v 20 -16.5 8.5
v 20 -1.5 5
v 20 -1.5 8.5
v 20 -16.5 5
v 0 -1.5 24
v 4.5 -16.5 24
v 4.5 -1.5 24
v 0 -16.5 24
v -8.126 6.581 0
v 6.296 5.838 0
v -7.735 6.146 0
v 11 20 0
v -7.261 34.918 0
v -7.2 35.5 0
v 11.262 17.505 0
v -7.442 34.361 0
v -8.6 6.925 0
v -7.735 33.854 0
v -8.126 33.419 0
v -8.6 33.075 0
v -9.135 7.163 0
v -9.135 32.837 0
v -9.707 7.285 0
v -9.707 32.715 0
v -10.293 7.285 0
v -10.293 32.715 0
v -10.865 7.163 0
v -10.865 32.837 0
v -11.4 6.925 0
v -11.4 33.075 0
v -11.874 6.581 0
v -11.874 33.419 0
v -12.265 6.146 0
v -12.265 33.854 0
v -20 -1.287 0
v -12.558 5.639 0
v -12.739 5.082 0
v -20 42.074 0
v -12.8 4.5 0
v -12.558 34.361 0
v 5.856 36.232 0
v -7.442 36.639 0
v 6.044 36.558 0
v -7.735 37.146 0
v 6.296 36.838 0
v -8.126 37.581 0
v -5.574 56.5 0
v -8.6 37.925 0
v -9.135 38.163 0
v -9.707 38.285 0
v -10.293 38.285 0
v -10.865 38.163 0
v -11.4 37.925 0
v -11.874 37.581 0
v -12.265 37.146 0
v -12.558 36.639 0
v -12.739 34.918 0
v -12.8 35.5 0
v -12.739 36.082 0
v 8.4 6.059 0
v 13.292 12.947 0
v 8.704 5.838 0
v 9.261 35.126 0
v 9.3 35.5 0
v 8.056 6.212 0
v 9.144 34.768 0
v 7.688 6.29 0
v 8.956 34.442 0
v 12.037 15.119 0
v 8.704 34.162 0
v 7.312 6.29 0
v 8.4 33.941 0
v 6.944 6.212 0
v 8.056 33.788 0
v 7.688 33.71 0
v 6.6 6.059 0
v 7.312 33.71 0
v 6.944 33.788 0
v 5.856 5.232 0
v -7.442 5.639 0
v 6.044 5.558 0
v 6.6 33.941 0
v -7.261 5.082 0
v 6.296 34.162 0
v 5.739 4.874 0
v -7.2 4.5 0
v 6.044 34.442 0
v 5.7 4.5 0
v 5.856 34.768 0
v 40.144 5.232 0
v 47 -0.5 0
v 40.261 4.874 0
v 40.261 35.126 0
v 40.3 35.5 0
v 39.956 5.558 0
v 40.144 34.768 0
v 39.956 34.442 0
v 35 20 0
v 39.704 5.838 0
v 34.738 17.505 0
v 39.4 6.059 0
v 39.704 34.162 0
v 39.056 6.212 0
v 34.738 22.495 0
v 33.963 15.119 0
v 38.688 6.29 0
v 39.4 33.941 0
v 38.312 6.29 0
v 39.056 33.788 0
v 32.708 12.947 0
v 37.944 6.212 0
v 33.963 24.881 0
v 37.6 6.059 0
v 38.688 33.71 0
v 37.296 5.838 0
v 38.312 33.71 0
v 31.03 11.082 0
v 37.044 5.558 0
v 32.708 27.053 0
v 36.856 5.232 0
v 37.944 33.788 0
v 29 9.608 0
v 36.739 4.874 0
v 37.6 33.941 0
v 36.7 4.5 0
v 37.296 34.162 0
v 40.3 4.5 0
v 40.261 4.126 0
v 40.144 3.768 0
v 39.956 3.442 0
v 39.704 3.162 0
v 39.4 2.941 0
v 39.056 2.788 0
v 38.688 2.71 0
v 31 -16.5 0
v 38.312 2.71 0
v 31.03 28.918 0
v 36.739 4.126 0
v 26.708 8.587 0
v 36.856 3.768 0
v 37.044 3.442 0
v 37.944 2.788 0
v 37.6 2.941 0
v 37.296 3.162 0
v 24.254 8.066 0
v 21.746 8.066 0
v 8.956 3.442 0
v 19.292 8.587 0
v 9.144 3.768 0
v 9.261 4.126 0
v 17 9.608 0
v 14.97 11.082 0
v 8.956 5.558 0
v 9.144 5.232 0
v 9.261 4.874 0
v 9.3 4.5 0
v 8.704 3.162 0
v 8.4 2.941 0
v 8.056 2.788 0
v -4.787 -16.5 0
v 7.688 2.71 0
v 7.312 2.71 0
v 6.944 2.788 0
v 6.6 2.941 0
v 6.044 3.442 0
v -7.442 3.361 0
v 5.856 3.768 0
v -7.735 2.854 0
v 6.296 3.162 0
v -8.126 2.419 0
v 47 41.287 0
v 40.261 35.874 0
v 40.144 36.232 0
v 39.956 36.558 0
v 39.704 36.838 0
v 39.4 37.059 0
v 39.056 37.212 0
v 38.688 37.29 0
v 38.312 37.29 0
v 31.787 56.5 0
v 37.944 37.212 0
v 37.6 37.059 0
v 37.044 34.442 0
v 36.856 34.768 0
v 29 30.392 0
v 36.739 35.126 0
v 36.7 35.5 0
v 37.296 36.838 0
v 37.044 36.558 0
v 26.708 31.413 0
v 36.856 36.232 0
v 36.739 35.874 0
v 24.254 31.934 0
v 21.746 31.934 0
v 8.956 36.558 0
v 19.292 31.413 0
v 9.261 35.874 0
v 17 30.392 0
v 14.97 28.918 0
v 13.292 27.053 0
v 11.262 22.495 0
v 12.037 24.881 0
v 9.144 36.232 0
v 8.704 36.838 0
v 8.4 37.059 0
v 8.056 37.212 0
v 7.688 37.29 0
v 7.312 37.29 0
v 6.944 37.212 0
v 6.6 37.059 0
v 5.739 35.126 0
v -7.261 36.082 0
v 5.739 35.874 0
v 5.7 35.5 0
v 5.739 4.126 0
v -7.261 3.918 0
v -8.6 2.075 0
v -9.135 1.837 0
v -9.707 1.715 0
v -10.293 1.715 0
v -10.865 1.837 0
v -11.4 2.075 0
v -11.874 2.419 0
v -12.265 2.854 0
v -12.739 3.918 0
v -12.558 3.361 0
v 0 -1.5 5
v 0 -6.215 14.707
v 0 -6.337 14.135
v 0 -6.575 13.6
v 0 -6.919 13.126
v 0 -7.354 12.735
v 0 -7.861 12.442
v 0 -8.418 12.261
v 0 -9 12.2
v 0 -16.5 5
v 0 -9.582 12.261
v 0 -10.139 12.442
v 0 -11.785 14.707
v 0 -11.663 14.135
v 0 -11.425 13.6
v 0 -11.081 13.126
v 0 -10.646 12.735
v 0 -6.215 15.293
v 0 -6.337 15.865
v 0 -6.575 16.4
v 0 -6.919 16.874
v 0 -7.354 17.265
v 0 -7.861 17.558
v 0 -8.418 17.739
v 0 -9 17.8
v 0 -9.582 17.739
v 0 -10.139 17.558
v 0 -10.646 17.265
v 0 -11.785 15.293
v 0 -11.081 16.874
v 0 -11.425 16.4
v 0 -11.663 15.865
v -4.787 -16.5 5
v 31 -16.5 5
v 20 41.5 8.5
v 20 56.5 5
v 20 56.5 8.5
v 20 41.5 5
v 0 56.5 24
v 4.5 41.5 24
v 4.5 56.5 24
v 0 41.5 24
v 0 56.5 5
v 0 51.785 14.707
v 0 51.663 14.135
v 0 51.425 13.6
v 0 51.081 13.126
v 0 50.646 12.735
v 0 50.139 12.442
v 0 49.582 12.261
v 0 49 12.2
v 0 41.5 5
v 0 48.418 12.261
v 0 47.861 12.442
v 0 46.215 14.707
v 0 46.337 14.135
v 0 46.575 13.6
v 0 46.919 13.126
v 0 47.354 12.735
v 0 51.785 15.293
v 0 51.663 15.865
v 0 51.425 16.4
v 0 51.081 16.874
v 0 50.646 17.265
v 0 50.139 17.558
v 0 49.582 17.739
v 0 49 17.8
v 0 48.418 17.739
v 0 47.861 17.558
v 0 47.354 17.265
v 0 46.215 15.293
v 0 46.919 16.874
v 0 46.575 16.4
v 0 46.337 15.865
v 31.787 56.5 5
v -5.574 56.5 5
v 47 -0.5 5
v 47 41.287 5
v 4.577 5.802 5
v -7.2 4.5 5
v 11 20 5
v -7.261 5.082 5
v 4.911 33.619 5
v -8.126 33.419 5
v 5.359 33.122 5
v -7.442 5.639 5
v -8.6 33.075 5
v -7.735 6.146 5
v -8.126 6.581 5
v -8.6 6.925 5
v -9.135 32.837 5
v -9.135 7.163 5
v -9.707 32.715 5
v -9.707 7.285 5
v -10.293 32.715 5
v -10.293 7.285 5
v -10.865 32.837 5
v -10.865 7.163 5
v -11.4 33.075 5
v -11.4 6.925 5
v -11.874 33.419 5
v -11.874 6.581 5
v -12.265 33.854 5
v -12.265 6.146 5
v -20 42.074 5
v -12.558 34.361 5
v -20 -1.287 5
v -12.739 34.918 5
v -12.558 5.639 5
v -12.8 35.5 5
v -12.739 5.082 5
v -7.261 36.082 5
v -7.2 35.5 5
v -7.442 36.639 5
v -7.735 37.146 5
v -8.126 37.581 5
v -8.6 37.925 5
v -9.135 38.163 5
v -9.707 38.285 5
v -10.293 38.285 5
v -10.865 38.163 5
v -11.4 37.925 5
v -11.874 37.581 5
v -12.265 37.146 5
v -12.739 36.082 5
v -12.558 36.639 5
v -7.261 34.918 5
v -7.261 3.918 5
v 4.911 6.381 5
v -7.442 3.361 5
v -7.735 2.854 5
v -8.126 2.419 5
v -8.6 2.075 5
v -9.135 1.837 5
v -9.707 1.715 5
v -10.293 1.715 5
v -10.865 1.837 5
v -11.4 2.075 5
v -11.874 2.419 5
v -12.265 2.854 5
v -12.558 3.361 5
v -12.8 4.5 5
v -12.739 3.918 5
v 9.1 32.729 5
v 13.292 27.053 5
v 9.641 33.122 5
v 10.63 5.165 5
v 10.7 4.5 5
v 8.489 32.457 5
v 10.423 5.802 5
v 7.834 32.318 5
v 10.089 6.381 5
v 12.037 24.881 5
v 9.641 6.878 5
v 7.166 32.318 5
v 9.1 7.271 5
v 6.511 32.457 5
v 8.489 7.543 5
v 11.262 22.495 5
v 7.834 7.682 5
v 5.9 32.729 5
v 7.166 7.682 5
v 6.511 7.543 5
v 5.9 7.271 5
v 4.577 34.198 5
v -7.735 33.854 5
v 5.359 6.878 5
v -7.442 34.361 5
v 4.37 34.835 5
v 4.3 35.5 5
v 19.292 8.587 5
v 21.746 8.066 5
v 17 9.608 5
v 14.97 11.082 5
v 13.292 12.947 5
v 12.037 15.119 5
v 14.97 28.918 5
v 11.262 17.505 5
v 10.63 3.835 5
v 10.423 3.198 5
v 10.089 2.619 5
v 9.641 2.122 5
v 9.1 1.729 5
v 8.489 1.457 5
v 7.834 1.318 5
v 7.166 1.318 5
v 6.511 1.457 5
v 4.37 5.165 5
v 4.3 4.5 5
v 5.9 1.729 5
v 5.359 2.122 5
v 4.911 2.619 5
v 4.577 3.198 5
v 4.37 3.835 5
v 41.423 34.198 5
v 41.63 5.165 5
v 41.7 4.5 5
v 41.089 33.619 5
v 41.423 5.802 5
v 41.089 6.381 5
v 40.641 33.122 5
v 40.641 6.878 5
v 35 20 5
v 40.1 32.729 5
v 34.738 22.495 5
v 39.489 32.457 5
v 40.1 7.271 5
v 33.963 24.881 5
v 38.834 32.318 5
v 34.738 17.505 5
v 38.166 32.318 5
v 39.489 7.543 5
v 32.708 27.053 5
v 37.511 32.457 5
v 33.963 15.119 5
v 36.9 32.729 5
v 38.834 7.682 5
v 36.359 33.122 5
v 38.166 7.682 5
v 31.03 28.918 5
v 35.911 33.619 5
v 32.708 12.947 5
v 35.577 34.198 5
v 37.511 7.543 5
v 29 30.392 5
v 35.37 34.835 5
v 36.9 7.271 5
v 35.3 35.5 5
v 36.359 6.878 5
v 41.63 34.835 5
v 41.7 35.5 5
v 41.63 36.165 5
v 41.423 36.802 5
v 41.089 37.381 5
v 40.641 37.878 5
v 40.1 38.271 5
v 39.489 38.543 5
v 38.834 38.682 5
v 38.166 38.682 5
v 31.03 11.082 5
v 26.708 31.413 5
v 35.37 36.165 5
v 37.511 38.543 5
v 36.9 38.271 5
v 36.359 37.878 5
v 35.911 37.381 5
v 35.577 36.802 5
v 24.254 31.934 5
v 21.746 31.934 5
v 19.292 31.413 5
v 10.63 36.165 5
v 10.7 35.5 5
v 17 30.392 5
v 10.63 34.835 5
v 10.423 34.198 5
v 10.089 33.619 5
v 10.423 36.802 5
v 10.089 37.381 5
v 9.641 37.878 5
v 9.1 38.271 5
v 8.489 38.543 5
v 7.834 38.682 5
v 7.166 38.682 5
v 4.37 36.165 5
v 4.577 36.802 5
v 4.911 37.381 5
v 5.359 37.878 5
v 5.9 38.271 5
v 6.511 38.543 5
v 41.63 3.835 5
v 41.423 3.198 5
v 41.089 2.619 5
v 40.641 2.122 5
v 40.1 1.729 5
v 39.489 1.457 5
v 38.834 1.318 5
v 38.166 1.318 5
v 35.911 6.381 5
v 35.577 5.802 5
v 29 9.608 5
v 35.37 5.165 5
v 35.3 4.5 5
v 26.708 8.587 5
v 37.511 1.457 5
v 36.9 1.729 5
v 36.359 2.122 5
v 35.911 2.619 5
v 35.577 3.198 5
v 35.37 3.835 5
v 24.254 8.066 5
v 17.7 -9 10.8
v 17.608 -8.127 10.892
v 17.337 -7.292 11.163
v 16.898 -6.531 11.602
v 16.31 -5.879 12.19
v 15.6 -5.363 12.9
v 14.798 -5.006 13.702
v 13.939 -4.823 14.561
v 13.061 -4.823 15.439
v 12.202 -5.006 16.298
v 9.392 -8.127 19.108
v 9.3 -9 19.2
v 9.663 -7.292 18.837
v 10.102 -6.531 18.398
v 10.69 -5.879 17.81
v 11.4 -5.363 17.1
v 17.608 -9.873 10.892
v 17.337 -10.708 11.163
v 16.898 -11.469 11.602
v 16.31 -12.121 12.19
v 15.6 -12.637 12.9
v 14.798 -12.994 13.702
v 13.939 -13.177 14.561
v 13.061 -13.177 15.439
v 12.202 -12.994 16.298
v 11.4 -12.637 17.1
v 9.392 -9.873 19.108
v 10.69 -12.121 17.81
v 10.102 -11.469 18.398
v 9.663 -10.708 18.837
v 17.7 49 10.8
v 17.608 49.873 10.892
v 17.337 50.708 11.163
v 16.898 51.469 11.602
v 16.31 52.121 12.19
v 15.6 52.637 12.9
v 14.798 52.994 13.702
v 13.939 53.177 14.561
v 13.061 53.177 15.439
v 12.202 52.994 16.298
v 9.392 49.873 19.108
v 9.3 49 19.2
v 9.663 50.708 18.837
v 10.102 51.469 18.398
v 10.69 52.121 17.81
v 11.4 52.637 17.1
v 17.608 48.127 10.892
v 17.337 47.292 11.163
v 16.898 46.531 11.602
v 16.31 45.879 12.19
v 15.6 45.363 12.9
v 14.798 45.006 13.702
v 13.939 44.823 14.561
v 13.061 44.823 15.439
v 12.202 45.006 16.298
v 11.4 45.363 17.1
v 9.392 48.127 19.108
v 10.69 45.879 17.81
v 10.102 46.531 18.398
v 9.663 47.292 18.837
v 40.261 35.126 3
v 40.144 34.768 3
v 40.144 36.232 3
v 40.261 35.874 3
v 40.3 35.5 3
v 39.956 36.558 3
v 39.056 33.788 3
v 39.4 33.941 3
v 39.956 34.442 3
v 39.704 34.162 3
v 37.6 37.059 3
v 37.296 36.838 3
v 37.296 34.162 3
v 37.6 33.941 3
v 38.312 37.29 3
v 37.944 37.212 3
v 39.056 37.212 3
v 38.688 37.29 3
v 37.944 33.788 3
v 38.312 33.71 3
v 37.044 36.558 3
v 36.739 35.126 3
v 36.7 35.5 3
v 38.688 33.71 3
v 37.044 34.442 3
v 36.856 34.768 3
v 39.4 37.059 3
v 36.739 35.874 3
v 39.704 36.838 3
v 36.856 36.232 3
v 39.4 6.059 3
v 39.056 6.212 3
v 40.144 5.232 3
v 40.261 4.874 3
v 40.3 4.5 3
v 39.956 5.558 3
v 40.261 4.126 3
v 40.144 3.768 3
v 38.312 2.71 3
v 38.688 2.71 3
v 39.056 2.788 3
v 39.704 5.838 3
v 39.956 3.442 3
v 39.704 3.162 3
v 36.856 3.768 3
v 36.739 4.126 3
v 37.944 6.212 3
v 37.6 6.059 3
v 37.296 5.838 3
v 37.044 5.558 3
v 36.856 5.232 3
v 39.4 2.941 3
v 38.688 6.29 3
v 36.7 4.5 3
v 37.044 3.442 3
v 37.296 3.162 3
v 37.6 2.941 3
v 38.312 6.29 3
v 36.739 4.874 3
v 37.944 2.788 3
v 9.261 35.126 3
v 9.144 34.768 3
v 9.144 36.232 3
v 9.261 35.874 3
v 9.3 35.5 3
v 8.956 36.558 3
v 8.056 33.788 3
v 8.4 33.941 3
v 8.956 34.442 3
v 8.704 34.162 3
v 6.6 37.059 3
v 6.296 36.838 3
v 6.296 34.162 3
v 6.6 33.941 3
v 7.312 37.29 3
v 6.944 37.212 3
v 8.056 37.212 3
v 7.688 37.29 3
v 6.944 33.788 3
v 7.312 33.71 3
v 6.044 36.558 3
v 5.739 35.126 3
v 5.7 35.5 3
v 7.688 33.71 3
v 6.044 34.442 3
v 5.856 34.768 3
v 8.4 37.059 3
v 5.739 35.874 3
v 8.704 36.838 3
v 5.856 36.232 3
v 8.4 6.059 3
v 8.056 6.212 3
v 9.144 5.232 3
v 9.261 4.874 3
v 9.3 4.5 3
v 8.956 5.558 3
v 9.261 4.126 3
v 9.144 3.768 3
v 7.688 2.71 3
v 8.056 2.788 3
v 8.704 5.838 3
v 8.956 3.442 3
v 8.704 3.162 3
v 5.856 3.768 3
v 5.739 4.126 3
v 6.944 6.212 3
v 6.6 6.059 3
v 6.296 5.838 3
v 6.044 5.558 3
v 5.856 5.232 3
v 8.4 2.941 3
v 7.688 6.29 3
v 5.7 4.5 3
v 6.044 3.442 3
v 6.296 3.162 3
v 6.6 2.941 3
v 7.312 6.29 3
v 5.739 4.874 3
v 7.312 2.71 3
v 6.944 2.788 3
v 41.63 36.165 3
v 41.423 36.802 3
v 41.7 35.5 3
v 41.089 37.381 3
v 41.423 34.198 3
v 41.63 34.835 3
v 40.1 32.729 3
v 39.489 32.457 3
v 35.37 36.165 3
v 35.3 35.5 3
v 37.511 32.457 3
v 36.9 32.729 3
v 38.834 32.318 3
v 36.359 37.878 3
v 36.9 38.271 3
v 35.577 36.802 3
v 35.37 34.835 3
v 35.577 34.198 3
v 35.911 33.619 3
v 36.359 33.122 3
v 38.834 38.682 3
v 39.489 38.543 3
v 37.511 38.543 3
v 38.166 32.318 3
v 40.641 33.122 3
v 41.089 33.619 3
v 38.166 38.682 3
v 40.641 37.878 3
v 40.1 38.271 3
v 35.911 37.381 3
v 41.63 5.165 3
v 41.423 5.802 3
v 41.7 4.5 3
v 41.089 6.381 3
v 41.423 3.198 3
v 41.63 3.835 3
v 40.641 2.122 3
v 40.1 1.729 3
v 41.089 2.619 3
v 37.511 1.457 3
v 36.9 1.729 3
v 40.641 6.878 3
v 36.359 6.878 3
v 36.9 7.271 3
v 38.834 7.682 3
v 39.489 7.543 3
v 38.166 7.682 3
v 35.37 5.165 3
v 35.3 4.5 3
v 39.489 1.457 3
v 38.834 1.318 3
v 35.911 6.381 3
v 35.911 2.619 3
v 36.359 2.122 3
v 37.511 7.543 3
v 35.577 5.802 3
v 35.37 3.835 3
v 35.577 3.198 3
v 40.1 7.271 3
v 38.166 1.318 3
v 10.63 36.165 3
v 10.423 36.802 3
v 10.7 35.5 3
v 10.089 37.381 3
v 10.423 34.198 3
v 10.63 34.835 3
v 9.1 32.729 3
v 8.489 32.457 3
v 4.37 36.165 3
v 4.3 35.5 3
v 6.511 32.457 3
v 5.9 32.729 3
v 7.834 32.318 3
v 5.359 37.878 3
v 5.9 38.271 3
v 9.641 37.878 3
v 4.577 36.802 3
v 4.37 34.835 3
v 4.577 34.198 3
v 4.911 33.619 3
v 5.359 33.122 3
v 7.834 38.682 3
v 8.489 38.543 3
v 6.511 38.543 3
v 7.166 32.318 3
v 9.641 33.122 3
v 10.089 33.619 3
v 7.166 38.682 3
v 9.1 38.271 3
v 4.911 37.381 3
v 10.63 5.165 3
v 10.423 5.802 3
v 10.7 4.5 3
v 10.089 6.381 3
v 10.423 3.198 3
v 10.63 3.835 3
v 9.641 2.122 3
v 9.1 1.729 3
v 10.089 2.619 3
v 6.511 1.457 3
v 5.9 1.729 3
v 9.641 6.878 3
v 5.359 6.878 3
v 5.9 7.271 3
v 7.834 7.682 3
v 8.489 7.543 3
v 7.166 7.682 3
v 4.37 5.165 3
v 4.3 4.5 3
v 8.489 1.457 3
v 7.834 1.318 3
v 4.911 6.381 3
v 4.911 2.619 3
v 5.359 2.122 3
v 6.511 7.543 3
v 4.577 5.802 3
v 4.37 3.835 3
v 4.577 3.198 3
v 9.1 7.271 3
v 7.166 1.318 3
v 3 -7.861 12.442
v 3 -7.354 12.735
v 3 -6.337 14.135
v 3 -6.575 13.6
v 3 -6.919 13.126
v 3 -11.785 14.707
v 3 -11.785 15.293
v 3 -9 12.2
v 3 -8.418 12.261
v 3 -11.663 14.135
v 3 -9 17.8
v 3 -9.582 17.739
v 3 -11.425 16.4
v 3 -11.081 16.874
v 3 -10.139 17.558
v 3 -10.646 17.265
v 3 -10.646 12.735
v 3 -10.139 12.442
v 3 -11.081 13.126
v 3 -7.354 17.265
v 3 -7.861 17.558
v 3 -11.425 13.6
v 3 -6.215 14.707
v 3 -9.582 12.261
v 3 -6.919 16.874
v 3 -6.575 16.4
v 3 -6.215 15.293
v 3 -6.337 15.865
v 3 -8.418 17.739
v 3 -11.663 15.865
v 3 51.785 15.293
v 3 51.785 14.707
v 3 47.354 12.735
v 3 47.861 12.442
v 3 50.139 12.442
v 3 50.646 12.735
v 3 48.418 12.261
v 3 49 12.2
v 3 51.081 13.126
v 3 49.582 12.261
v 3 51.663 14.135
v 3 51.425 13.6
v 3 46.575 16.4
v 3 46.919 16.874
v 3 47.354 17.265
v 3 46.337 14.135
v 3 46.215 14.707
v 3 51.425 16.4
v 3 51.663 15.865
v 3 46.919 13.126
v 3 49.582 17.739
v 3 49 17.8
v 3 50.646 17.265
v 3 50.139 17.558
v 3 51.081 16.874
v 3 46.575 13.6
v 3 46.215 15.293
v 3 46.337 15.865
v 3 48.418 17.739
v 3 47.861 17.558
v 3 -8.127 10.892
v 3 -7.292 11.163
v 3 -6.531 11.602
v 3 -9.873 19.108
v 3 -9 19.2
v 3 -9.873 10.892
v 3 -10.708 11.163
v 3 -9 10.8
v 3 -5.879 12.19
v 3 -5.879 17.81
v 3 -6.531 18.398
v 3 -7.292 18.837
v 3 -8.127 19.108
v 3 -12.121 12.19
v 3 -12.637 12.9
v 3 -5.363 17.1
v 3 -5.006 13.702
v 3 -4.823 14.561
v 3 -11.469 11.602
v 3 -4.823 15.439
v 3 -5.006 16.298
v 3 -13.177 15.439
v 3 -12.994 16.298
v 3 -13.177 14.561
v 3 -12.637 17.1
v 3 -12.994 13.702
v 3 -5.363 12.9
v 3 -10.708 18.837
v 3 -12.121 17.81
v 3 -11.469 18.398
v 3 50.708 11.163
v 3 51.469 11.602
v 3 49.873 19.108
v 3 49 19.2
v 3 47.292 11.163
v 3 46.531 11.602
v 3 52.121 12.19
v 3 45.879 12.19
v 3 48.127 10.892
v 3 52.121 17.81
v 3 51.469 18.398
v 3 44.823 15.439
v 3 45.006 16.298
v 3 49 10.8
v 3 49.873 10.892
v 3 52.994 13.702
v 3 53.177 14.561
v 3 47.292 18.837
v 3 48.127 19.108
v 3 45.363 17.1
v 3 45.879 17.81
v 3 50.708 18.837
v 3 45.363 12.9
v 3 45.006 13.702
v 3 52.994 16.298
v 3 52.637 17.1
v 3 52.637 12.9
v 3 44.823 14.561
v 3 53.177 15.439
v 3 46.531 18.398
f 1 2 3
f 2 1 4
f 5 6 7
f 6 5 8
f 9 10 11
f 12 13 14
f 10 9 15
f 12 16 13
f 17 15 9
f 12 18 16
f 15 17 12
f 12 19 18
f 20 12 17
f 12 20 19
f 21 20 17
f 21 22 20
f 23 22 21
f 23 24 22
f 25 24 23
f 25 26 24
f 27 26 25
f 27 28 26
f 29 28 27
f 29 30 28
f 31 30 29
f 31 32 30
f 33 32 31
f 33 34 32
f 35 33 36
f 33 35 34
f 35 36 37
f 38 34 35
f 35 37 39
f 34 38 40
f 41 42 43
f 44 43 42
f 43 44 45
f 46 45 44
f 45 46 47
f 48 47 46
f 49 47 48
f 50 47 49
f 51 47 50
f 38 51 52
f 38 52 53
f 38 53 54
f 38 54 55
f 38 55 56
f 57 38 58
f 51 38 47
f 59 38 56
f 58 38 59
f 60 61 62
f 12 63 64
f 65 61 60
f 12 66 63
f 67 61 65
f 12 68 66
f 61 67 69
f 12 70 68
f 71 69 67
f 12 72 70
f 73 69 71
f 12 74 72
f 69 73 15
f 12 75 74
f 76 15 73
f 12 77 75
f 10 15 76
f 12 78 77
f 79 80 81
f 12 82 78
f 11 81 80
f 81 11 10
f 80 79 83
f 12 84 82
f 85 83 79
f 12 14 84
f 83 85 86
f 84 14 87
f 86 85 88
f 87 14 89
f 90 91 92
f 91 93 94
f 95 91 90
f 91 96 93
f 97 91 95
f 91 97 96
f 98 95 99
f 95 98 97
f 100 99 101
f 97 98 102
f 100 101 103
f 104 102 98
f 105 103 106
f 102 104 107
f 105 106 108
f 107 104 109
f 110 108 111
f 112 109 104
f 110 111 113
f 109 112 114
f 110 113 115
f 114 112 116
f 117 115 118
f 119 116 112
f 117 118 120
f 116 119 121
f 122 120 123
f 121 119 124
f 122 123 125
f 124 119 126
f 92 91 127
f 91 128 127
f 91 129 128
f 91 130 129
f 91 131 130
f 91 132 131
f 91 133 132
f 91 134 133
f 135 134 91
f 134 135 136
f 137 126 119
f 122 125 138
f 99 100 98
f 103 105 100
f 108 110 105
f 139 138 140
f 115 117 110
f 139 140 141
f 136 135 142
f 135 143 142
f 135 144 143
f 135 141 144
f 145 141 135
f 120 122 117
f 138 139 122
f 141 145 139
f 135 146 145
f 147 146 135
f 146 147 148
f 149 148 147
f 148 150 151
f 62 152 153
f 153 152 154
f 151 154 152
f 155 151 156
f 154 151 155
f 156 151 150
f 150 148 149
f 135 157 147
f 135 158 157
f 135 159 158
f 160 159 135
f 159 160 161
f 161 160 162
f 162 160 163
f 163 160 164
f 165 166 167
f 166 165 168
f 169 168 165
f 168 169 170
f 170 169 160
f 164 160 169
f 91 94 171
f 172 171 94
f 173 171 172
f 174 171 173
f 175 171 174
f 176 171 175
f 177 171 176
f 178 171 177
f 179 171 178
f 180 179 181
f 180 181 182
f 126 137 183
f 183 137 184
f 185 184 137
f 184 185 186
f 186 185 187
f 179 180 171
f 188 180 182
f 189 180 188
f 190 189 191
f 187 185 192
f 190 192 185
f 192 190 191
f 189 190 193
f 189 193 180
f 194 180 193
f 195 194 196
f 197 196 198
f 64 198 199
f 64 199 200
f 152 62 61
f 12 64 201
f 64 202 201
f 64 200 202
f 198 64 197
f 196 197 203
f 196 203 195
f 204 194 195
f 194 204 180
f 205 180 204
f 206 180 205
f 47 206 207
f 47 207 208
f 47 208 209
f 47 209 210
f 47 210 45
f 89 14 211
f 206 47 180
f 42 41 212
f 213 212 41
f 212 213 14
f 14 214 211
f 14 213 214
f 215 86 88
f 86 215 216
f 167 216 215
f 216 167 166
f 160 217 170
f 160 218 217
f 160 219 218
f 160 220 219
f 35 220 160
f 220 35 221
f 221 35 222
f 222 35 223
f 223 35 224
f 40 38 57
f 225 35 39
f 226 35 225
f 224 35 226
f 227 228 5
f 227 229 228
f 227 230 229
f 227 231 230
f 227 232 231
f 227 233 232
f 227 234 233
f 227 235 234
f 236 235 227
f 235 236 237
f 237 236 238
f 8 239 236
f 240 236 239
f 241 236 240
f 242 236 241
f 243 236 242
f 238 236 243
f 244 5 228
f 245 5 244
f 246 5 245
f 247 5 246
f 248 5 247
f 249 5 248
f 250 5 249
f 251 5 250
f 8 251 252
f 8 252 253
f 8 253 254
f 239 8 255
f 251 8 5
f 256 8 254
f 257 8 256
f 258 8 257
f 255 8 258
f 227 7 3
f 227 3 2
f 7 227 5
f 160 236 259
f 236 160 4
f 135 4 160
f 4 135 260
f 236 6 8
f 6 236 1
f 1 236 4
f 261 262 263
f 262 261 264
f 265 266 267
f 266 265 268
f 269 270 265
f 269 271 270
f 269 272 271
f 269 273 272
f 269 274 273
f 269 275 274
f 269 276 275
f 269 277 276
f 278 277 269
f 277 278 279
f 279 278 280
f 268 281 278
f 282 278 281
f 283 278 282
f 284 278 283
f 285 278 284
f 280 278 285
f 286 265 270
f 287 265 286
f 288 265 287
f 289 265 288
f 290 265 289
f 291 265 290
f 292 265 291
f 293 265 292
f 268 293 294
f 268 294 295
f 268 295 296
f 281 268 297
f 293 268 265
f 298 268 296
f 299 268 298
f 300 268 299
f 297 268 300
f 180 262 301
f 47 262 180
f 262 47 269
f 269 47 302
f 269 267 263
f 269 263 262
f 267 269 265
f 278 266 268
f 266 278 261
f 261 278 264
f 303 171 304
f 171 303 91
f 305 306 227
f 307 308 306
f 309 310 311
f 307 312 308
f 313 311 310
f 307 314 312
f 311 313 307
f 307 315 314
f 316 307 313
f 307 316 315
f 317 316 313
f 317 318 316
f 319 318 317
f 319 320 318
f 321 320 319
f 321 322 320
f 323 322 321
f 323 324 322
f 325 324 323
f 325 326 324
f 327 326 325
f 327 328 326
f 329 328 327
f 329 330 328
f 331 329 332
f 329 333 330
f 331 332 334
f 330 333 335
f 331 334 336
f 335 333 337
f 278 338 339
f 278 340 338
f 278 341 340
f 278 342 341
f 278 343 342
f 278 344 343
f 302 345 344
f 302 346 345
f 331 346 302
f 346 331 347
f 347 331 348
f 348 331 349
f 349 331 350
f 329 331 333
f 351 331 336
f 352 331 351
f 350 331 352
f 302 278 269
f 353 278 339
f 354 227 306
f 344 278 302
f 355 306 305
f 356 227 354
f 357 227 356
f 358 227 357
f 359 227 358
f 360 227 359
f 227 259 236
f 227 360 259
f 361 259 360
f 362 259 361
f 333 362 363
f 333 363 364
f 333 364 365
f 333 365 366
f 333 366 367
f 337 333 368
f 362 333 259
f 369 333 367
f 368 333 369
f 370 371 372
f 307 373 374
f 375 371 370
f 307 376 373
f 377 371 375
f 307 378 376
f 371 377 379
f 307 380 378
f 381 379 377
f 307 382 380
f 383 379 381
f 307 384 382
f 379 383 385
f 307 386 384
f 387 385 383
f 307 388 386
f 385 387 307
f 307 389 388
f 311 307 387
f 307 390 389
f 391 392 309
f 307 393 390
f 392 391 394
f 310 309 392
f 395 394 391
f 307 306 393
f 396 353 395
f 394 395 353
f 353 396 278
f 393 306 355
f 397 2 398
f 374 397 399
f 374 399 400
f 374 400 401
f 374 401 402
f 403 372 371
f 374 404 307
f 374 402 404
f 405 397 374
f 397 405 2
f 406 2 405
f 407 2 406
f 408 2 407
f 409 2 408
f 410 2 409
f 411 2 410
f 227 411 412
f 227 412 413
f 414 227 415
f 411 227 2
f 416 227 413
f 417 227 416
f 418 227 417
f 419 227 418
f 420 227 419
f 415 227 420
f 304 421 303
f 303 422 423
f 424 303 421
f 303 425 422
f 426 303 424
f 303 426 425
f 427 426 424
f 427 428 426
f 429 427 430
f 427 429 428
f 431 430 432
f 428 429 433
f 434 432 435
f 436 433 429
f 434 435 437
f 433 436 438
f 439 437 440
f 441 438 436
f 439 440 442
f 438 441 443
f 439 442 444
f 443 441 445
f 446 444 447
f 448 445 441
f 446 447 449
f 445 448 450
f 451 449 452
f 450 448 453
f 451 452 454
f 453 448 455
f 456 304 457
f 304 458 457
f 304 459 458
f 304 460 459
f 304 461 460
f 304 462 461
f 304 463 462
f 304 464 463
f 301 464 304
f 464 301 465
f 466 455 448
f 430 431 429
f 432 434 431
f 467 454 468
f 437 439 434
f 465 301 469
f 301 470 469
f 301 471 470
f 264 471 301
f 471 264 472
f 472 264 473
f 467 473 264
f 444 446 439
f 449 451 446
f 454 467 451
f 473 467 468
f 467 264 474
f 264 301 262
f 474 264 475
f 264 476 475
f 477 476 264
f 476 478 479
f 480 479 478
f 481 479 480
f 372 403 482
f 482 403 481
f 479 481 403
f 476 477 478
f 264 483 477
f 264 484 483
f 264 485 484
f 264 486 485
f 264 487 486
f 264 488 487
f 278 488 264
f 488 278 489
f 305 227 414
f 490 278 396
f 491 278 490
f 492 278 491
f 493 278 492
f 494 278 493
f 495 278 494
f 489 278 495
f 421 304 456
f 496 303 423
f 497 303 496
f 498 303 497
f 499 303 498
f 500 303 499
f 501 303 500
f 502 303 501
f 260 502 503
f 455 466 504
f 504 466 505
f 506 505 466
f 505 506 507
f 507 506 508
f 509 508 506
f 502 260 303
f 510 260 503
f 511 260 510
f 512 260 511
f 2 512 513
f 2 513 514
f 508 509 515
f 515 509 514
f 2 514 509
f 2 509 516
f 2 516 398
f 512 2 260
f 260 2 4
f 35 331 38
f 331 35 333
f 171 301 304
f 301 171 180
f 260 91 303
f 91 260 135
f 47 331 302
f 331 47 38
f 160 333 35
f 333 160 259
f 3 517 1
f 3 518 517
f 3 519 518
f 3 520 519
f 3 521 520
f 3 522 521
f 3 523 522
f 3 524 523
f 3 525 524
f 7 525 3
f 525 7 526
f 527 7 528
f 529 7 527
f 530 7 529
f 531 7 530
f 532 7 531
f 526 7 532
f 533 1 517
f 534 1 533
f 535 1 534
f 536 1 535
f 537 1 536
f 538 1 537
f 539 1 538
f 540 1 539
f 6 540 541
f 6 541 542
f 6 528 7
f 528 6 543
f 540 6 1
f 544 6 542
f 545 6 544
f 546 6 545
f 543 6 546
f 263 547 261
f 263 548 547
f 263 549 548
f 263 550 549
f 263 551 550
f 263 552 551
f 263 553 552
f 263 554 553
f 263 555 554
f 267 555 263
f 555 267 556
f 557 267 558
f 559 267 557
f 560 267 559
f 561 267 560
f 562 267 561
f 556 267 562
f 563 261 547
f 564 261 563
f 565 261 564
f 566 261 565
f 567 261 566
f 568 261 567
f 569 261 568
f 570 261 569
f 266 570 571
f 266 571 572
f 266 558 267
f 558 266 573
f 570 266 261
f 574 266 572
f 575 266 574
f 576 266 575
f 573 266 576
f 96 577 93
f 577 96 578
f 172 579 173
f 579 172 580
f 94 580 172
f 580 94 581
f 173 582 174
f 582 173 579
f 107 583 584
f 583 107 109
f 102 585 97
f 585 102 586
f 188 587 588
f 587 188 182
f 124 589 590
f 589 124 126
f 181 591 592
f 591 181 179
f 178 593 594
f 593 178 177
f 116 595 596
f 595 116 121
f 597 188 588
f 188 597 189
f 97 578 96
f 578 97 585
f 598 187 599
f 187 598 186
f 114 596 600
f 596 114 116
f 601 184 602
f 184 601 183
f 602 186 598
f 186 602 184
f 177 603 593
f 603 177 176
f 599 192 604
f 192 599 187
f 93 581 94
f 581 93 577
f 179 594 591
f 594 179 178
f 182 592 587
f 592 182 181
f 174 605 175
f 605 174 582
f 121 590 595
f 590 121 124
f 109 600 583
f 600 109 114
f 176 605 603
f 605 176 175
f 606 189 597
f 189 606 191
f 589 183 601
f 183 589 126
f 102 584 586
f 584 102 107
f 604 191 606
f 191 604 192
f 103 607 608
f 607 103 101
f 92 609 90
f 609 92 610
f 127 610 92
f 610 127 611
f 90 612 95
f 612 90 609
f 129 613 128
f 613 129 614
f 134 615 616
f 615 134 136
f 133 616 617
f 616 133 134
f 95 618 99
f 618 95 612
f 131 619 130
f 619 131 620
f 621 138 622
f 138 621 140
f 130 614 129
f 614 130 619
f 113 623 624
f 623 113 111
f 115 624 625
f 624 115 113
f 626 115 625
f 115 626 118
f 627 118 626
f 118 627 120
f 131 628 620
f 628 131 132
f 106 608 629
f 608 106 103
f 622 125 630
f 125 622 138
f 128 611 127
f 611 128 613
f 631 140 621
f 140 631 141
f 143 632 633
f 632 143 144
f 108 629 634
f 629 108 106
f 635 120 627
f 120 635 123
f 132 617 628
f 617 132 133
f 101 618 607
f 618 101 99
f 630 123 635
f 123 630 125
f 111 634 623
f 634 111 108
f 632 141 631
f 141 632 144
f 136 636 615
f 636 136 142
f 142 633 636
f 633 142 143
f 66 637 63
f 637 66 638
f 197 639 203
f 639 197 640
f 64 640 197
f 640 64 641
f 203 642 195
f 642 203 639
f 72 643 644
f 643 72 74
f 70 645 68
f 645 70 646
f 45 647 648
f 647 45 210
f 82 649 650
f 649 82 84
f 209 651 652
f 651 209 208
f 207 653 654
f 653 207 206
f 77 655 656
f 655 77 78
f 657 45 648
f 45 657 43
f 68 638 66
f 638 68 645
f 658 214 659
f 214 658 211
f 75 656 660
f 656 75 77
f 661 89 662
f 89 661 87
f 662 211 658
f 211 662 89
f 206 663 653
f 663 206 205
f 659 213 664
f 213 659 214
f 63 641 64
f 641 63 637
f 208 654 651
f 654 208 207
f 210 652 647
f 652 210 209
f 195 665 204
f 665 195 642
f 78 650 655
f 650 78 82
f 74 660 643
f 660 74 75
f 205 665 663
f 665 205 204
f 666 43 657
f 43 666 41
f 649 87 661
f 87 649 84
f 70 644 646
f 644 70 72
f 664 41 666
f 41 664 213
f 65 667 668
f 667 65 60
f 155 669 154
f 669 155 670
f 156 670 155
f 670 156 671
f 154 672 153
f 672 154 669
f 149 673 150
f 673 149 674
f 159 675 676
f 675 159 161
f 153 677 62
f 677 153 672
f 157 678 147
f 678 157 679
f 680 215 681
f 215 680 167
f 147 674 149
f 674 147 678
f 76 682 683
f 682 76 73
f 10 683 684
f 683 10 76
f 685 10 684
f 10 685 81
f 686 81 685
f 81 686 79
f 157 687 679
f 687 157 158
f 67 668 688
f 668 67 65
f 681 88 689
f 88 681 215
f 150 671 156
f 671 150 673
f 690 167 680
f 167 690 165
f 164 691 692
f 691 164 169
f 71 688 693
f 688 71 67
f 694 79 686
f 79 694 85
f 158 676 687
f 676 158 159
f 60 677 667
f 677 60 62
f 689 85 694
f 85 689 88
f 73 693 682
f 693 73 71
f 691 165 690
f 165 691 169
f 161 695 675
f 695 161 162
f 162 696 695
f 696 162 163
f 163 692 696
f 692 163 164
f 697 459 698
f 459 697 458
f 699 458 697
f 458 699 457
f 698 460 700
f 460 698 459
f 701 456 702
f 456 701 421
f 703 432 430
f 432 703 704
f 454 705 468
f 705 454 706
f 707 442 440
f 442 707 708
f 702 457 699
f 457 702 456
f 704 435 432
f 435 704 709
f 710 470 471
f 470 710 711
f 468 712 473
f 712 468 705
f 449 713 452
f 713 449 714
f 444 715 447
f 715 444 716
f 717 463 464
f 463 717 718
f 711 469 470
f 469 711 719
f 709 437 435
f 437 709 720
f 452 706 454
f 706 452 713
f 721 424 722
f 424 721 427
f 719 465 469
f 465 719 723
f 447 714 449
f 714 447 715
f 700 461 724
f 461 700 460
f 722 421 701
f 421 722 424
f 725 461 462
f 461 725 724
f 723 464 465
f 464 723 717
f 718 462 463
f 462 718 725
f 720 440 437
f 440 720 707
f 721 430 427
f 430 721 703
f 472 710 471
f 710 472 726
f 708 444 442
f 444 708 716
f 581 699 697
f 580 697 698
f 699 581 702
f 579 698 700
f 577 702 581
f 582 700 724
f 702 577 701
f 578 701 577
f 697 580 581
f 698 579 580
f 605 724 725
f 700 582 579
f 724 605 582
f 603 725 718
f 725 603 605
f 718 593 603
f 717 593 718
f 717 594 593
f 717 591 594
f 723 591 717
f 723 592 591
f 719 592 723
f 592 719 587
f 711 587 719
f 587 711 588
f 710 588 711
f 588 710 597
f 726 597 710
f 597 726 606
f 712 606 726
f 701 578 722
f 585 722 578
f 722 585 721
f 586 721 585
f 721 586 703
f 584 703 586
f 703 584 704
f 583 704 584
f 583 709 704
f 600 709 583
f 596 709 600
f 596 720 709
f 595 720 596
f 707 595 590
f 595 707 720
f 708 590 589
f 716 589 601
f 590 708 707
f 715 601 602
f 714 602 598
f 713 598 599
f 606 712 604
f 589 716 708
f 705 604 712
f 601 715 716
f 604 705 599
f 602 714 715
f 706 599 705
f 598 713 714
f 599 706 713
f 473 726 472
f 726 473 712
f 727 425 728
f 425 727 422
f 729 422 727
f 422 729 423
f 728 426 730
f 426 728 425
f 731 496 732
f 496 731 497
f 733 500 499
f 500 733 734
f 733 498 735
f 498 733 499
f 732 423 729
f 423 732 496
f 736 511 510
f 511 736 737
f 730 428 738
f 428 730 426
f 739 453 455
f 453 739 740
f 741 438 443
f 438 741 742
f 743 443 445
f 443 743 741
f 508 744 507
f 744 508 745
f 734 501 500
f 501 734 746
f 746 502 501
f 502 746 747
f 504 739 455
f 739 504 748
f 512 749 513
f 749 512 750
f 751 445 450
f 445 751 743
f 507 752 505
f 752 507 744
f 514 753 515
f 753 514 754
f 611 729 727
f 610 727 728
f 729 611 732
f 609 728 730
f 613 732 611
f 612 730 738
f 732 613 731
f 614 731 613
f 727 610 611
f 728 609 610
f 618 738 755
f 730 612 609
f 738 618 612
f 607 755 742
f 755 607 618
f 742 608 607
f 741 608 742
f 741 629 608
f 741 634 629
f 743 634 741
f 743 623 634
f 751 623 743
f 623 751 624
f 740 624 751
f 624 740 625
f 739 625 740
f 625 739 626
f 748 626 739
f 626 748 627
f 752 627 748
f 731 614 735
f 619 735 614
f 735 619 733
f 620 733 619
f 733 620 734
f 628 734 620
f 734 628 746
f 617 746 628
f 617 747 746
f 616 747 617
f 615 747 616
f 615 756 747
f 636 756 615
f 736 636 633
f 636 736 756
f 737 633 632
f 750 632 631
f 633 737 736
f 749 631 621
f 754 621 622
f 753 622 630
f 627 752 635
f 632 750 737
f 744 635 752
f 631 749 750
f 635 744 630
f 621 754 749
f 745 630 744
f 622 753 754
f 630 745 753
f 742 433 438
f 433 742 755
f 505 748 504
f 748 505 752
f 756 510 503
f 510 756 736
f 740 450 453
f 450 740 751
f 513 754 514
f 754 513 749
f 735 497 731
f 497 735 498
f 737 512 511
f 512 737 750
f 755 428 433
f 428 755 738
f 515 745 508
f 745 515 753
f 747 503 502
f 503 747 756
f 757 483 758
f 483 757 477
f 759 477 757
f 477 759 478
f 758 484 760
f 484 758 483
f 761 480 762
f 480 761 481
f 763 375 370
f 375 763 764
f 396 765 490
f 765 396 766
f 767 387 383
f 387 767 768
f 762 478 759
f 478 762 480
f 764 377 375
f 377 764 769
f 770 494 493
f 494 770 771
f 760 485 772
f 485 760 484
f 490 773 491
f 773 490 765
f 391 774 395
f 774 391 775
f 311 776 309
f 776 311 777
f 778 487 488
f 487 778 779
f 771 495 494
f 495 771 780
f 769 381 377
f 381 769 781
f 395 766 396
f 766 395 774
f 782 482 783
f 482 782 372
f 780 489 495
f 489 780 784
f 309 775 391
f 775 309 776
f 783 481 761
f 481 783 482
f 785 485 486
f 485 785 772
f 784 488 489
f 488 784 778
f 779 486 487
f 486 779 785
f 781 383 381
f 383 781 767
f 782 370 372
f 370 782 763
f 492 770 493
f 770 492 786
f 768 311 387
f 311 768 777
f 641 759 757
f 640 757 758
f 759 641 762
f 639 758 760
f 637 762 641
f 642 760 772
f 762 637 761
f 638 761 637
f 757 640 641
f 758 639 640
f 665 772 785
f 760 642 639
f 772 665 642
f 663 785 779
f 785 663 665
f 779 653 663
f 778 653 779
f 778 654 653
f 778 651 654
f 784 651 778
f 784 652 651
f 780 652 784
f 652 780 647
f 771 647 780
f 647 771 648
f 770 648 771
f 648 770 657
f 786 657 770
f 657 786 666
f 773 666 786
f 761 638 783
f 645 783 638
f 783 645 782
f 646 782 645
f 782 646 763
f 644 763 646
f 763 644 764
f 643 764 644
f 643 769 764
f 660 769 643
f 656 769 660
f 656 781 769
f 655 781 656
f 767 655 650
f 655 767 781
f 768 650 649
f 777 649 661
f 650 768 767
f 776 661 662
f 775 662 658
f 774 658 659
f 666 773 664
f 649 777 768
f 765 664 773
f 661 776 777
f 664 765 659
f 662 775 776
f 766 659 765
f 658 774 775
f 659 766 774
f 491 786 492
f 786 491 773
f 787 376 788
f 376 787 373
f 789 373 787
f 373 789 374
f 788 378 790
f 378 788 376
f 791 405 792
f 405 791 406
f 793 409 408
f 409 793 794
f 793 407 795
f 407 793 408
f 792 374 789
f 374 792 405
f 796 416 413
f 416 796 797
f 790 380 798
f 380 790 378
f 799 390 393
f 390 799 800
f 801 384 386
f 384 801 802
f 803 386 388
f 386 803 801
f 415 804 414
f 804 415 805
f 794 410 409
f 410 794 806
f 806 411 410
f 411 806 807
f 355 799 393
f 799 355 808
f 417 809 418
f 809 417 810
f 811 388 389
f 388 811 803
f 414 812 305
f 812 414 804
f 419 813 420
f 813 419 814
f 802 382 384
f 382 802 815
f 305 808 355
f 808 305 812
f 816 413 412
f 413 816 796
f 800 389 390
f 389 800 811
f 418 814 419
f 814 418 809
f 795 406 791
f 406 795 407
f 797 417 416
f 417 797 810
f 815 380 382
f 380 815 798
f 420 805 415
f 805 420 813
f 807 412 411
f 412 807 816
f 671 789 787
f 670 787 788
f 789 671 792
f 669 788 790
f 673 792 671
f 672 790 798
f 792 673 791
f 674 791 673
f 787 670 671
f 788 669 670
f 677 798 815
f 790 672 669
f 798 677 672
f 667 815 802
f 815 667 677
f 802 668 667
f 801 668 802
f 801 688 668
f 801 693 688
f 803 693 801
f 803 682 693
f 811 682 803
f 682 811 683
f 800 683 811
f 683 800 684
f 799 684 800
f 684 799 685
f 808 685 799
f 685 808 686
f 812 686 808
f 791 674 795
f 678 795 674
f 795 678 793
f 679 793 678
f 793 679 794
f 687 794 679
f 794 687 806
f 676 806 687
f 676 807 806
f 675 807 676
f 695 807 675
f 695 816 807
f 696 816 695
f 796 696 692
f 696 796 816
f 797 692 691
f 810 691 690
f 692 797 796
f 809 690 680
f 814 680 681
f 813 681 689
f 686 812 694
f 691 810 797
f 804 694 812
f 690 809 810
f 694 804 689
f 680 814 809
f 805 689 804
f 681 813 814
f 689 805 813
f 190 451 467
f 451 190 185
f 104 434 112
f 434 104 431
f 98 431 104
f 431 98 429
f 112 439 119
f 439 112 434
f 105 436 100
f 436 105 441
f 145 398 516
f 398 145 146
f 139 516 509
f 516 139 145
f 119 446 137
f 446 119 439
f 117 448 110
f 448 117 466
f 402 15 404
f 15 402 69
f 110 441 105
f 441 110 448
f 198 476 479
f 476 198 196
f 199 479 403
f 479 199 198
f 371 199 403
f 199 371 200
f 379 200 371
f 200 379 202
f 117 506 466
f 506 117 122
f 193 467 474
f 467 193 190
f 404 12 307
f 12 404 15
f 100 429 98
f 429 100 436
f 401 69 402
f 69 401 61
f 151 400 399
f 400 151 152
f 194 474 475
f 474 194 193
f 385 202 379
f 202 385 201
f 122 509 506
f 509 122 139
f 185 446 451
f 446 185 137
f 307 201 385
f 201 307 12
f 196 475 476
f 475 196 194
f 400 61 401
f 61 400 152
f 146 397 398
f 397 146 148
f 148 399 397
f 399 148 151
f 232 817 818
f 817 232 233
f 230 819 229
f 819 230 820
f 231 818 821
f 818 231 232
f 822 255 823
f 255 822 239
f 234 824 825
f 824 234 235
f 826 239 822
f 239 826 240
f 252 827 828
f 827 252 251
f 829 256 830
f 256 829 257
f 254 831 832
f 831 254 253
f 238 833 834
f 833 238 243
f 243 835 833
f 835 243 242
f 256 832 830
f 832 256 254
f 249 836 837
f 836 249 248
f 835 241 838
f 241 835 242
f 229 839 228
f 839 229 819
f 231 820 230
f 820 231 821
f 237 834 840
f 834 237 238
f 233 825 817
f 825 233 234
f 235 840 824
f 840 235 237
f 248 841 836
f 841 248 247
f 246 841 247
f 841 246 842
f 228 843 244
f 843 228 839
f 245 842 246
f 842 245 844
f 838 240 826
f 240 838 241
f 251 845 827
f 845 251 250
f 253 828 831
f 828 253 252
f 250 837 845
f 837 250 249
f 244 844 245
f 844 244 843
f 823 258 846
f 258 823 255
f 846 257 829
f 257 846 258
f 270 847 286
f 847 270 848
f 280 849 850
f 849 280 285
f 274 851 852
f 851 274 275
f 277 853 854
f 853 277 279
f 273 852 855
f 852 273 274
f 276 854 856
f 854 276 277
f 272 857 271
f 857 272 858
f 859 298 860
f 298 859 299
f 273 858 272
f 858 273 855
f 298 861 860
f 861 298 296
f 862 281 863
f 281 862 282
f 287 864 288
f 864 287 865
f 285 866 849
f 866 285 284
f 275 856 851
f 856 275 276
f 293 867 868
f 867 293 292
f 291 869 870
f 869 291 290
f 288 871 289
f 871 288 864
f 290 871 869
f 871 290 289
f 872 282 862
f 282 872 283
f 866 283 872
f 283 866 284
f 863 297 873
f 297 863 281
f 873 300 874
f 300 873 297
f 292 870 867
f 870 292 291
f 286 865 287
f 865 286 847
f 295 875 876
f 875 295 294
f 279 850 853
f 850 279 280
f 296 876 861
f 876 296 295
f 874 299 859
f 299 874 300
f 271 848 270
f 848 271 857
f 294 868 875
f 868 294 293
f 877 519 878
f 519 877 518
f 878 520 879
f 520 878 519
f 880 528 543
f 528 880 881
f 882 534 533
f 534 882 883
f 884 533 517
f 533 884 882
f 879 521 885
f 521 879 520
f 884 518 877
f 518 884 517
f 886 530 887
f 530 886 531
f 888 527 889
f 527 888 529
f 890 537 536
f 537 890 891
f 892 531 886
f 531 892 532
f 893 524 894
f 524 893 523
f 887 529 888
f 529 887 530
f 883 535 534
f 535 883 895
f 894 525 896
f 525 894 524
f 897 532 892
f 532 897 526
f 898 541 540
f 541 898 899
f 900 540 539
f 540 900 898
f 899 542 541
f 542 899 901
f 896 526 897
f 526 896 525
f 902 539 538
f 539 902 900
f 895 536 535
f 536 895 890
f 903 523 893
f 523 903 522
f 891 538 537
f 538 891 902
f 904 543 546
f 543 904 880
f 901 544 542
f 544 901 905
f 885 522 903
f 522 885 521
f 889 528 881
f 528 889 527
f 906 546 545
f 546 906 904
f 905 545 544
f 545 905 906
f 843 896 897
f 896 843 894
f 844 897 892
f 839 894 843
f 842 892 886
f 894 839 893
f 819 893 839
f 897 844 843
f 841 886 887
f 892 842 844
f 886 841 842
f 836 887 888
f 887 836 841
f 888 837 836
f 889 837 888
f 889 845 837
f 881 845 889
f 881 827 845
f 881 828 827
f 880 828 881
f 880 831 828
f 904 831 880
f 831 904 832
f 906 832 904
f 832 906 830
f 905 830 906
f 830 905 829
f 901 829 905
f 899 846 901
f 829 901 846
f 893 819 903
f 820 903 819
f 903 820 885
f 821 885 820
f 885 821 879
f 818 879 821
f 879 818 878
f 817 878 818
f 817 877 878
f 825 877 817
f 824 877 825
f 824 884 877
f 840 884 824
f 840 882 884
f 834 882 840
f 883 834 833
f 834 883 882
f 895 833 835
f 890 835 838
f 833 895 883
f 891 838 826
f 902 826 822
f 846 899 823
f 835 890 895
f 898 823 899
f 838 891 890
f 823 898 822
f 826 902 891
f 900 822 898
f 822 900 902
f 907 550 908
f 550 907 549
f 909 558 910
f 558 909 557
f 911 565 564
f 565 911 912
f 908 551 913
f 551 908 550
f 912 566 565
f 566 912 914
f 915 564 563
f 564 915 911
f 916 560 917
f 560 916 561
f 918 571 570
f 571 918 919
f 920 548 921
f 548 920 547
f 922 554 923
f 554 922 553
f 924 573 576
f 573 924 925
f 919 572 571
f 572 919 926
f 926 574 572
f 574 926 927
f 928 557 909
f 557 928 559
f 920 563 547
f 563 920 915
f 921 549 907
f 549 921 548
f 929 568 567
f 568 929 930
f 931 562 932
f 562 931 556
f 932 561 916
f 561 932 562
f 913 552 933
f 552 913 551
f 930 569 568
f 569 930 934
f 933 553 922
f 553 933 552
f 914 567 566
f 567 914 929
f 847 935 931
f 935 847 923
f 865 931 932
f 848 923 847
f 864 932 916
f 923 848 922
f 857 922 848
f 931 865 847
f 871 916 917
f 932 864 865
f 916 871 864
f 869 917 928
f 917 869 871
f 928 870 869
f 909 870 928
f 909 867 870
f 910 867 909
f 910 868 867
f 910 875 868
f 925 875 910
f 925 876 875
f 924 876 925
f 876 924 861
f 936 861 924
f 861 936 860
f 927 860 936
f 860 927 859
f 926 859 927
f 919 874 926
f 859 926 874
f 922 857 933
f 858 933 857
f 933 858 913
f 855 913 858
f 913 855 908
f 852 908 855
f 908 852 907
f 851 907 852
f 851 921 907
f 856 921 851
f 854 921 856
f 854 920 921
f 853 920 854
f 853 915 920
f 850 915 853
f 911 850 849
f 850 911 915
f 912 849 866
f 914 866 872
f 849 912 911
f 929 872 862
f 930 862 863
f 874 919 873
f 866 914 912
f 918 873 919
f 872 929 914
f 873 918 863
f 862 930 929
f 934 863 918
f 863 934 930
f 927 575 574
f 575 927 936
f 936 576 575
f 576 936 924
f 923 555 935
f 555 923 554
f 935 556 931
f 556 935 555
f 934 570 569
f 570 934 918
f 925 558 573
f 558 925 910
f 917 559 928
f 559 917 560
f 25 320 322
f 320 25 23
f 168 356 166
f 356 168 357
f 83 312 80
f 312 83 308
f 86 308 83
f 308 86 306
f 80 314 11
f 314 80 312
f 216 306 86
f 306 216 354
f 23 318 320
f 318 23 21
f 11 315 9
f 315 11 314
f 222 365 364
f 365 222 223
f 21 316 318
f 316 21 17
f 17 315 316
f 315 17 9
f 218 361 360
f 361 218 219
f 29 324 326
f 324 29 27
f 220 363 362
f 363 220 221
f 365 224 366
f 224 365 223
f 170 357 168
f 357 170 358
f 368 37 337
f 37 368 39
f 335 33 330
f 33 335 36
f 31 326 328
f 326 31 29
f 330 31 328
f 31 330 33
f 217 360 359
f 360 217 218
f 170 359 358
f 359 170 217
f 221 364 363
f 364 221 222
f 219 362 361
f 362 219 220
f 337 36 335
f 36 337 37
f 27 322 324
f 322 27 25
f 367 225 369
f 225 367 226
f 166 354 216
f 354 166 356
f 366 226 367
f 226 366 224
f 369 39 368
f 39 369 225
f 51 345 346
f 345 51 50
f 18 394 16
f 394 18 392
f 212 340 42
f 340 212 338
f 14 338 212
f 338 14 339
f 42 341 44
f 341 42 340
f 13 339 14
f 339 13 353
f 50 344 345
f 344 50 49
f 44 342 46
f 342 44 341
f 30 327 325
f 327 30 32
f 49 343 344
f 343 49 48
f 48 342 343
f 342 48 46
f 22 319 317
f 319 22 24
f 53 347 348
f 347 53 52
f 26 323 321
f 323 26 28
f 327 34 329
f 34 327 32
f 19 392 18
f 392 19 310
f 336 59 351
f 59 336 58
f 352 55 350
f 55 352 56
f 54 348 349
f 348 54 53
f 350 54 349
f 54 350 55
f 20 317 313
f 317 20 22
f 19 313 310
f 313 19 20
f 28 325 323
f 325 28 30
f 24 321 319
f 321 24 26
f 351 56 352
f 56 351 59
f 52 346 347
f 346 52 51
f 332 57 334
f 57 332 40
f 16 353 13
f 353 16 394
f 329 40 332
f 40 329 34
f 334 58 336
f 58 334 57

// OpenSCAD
// PRUSA iteration3
// Z axis bottom holder
// GNU GPL v3
// Josef Průša <iam@josefprusa.cz> and contributors
// http://www.reprap.org/wiki/Prusa_Mendel
// http://prusamendel.org

module z_bottom_base(){
 translate([0,-16.5,0]) cube([20,15,24]); // plate touching the base
 translate([0,41.5,0]) cube([20,15,24]); // plate touching the base
 translate([-20,-16.5,0]) cube([67,73,5]); // plate touching the base
}

module z_bottom_fancy(){
    translate([47-6,-1+2.5+67,0]) rotate([0,0,-45-90]) translate([-15,0,-1]) cube([30,30,51]);
    translate([47-6,-9+2.5,0]) rotate([0,0,-45-90]) translate([-15,0,-1]) cube([30,30,51]);
 
    translate([-36,-1+2.5+67,0]) rotate([0,0,-45-90]) translate([-15,0,-1]) cube([30,30,51]);
    translate([-36,-9+2.5,0]) rotate([0,0,-45-90]) translate([-15,0,-1]) cube([30,30,51]);
 
    // Stiffner cut out
    translate([23,0,5.5]) rotate([0,-45,0]) translate([0,-17.1,0]) cube([30,80,30]);
}

module z_bottom_holes(){
    // Frame mounting screw holes
    translate([-1,-9,15]) rotate([0,90,0]) cylinder(h = 50, r=2.8, $fn=30);
    translate([-1,49,15]) rotate([0,90,0]) cylinder(h = 50, r=2.8, $fn=30);

    // Frame mounting screw head holes
    translate([3,-9,15]) rotate([0,90,0]) cylinder(h = 20, r=4.2, $fn=30);
    translate([3,49,15]) rotate([0,90,0]) cylinder(h = 20, r=4.2, $fn=30);

    // Frame mounting screw holes
    translate([-10,4.5,-1]) cylinder(h = 50, r=2.8, $fn=30);
    translate([-10,35.5,-1]) cylinder(h = 50, r=2.8, $fn=30);

    // motor mounting
    translate([23,20,-1]){

    translate([15.5,15.5,-1]) cylinder(h = 30, r=1.8, $fn=30);
    translate([15.5,-15.5,-1]) cylinder(h = 30, r=1.8, $fn=30);
    translate([-15.5,15.5,-1]) cylinder(h = 30, r=1.8, $fn=30);
    translate([-15.5,-15.5,-1]) cylinder(h = 30, r=1.8, $fn=30);

    translate([15.5,15.5,4]) cylinder(h = 30, r=3.2, $fn=30);
    translate([15.5,-15.5,4]) cylinder(h = 30, r=3.2, $fn=30);
    translate([-15.5,15.5,4]) cylinder(h = 30, r=3.2, $fn=30);
    translate([-15.5,-15.5,4]) cylinder(h = 30, r=3.2, $fn=30);

    translate([0,0,-1]) cylinder(h = 20, r=12, $fn=30);
 }

}

difference(){
    z_bottom_base();
    z_bottom_fancy();
    z_bottom_holes();
}
